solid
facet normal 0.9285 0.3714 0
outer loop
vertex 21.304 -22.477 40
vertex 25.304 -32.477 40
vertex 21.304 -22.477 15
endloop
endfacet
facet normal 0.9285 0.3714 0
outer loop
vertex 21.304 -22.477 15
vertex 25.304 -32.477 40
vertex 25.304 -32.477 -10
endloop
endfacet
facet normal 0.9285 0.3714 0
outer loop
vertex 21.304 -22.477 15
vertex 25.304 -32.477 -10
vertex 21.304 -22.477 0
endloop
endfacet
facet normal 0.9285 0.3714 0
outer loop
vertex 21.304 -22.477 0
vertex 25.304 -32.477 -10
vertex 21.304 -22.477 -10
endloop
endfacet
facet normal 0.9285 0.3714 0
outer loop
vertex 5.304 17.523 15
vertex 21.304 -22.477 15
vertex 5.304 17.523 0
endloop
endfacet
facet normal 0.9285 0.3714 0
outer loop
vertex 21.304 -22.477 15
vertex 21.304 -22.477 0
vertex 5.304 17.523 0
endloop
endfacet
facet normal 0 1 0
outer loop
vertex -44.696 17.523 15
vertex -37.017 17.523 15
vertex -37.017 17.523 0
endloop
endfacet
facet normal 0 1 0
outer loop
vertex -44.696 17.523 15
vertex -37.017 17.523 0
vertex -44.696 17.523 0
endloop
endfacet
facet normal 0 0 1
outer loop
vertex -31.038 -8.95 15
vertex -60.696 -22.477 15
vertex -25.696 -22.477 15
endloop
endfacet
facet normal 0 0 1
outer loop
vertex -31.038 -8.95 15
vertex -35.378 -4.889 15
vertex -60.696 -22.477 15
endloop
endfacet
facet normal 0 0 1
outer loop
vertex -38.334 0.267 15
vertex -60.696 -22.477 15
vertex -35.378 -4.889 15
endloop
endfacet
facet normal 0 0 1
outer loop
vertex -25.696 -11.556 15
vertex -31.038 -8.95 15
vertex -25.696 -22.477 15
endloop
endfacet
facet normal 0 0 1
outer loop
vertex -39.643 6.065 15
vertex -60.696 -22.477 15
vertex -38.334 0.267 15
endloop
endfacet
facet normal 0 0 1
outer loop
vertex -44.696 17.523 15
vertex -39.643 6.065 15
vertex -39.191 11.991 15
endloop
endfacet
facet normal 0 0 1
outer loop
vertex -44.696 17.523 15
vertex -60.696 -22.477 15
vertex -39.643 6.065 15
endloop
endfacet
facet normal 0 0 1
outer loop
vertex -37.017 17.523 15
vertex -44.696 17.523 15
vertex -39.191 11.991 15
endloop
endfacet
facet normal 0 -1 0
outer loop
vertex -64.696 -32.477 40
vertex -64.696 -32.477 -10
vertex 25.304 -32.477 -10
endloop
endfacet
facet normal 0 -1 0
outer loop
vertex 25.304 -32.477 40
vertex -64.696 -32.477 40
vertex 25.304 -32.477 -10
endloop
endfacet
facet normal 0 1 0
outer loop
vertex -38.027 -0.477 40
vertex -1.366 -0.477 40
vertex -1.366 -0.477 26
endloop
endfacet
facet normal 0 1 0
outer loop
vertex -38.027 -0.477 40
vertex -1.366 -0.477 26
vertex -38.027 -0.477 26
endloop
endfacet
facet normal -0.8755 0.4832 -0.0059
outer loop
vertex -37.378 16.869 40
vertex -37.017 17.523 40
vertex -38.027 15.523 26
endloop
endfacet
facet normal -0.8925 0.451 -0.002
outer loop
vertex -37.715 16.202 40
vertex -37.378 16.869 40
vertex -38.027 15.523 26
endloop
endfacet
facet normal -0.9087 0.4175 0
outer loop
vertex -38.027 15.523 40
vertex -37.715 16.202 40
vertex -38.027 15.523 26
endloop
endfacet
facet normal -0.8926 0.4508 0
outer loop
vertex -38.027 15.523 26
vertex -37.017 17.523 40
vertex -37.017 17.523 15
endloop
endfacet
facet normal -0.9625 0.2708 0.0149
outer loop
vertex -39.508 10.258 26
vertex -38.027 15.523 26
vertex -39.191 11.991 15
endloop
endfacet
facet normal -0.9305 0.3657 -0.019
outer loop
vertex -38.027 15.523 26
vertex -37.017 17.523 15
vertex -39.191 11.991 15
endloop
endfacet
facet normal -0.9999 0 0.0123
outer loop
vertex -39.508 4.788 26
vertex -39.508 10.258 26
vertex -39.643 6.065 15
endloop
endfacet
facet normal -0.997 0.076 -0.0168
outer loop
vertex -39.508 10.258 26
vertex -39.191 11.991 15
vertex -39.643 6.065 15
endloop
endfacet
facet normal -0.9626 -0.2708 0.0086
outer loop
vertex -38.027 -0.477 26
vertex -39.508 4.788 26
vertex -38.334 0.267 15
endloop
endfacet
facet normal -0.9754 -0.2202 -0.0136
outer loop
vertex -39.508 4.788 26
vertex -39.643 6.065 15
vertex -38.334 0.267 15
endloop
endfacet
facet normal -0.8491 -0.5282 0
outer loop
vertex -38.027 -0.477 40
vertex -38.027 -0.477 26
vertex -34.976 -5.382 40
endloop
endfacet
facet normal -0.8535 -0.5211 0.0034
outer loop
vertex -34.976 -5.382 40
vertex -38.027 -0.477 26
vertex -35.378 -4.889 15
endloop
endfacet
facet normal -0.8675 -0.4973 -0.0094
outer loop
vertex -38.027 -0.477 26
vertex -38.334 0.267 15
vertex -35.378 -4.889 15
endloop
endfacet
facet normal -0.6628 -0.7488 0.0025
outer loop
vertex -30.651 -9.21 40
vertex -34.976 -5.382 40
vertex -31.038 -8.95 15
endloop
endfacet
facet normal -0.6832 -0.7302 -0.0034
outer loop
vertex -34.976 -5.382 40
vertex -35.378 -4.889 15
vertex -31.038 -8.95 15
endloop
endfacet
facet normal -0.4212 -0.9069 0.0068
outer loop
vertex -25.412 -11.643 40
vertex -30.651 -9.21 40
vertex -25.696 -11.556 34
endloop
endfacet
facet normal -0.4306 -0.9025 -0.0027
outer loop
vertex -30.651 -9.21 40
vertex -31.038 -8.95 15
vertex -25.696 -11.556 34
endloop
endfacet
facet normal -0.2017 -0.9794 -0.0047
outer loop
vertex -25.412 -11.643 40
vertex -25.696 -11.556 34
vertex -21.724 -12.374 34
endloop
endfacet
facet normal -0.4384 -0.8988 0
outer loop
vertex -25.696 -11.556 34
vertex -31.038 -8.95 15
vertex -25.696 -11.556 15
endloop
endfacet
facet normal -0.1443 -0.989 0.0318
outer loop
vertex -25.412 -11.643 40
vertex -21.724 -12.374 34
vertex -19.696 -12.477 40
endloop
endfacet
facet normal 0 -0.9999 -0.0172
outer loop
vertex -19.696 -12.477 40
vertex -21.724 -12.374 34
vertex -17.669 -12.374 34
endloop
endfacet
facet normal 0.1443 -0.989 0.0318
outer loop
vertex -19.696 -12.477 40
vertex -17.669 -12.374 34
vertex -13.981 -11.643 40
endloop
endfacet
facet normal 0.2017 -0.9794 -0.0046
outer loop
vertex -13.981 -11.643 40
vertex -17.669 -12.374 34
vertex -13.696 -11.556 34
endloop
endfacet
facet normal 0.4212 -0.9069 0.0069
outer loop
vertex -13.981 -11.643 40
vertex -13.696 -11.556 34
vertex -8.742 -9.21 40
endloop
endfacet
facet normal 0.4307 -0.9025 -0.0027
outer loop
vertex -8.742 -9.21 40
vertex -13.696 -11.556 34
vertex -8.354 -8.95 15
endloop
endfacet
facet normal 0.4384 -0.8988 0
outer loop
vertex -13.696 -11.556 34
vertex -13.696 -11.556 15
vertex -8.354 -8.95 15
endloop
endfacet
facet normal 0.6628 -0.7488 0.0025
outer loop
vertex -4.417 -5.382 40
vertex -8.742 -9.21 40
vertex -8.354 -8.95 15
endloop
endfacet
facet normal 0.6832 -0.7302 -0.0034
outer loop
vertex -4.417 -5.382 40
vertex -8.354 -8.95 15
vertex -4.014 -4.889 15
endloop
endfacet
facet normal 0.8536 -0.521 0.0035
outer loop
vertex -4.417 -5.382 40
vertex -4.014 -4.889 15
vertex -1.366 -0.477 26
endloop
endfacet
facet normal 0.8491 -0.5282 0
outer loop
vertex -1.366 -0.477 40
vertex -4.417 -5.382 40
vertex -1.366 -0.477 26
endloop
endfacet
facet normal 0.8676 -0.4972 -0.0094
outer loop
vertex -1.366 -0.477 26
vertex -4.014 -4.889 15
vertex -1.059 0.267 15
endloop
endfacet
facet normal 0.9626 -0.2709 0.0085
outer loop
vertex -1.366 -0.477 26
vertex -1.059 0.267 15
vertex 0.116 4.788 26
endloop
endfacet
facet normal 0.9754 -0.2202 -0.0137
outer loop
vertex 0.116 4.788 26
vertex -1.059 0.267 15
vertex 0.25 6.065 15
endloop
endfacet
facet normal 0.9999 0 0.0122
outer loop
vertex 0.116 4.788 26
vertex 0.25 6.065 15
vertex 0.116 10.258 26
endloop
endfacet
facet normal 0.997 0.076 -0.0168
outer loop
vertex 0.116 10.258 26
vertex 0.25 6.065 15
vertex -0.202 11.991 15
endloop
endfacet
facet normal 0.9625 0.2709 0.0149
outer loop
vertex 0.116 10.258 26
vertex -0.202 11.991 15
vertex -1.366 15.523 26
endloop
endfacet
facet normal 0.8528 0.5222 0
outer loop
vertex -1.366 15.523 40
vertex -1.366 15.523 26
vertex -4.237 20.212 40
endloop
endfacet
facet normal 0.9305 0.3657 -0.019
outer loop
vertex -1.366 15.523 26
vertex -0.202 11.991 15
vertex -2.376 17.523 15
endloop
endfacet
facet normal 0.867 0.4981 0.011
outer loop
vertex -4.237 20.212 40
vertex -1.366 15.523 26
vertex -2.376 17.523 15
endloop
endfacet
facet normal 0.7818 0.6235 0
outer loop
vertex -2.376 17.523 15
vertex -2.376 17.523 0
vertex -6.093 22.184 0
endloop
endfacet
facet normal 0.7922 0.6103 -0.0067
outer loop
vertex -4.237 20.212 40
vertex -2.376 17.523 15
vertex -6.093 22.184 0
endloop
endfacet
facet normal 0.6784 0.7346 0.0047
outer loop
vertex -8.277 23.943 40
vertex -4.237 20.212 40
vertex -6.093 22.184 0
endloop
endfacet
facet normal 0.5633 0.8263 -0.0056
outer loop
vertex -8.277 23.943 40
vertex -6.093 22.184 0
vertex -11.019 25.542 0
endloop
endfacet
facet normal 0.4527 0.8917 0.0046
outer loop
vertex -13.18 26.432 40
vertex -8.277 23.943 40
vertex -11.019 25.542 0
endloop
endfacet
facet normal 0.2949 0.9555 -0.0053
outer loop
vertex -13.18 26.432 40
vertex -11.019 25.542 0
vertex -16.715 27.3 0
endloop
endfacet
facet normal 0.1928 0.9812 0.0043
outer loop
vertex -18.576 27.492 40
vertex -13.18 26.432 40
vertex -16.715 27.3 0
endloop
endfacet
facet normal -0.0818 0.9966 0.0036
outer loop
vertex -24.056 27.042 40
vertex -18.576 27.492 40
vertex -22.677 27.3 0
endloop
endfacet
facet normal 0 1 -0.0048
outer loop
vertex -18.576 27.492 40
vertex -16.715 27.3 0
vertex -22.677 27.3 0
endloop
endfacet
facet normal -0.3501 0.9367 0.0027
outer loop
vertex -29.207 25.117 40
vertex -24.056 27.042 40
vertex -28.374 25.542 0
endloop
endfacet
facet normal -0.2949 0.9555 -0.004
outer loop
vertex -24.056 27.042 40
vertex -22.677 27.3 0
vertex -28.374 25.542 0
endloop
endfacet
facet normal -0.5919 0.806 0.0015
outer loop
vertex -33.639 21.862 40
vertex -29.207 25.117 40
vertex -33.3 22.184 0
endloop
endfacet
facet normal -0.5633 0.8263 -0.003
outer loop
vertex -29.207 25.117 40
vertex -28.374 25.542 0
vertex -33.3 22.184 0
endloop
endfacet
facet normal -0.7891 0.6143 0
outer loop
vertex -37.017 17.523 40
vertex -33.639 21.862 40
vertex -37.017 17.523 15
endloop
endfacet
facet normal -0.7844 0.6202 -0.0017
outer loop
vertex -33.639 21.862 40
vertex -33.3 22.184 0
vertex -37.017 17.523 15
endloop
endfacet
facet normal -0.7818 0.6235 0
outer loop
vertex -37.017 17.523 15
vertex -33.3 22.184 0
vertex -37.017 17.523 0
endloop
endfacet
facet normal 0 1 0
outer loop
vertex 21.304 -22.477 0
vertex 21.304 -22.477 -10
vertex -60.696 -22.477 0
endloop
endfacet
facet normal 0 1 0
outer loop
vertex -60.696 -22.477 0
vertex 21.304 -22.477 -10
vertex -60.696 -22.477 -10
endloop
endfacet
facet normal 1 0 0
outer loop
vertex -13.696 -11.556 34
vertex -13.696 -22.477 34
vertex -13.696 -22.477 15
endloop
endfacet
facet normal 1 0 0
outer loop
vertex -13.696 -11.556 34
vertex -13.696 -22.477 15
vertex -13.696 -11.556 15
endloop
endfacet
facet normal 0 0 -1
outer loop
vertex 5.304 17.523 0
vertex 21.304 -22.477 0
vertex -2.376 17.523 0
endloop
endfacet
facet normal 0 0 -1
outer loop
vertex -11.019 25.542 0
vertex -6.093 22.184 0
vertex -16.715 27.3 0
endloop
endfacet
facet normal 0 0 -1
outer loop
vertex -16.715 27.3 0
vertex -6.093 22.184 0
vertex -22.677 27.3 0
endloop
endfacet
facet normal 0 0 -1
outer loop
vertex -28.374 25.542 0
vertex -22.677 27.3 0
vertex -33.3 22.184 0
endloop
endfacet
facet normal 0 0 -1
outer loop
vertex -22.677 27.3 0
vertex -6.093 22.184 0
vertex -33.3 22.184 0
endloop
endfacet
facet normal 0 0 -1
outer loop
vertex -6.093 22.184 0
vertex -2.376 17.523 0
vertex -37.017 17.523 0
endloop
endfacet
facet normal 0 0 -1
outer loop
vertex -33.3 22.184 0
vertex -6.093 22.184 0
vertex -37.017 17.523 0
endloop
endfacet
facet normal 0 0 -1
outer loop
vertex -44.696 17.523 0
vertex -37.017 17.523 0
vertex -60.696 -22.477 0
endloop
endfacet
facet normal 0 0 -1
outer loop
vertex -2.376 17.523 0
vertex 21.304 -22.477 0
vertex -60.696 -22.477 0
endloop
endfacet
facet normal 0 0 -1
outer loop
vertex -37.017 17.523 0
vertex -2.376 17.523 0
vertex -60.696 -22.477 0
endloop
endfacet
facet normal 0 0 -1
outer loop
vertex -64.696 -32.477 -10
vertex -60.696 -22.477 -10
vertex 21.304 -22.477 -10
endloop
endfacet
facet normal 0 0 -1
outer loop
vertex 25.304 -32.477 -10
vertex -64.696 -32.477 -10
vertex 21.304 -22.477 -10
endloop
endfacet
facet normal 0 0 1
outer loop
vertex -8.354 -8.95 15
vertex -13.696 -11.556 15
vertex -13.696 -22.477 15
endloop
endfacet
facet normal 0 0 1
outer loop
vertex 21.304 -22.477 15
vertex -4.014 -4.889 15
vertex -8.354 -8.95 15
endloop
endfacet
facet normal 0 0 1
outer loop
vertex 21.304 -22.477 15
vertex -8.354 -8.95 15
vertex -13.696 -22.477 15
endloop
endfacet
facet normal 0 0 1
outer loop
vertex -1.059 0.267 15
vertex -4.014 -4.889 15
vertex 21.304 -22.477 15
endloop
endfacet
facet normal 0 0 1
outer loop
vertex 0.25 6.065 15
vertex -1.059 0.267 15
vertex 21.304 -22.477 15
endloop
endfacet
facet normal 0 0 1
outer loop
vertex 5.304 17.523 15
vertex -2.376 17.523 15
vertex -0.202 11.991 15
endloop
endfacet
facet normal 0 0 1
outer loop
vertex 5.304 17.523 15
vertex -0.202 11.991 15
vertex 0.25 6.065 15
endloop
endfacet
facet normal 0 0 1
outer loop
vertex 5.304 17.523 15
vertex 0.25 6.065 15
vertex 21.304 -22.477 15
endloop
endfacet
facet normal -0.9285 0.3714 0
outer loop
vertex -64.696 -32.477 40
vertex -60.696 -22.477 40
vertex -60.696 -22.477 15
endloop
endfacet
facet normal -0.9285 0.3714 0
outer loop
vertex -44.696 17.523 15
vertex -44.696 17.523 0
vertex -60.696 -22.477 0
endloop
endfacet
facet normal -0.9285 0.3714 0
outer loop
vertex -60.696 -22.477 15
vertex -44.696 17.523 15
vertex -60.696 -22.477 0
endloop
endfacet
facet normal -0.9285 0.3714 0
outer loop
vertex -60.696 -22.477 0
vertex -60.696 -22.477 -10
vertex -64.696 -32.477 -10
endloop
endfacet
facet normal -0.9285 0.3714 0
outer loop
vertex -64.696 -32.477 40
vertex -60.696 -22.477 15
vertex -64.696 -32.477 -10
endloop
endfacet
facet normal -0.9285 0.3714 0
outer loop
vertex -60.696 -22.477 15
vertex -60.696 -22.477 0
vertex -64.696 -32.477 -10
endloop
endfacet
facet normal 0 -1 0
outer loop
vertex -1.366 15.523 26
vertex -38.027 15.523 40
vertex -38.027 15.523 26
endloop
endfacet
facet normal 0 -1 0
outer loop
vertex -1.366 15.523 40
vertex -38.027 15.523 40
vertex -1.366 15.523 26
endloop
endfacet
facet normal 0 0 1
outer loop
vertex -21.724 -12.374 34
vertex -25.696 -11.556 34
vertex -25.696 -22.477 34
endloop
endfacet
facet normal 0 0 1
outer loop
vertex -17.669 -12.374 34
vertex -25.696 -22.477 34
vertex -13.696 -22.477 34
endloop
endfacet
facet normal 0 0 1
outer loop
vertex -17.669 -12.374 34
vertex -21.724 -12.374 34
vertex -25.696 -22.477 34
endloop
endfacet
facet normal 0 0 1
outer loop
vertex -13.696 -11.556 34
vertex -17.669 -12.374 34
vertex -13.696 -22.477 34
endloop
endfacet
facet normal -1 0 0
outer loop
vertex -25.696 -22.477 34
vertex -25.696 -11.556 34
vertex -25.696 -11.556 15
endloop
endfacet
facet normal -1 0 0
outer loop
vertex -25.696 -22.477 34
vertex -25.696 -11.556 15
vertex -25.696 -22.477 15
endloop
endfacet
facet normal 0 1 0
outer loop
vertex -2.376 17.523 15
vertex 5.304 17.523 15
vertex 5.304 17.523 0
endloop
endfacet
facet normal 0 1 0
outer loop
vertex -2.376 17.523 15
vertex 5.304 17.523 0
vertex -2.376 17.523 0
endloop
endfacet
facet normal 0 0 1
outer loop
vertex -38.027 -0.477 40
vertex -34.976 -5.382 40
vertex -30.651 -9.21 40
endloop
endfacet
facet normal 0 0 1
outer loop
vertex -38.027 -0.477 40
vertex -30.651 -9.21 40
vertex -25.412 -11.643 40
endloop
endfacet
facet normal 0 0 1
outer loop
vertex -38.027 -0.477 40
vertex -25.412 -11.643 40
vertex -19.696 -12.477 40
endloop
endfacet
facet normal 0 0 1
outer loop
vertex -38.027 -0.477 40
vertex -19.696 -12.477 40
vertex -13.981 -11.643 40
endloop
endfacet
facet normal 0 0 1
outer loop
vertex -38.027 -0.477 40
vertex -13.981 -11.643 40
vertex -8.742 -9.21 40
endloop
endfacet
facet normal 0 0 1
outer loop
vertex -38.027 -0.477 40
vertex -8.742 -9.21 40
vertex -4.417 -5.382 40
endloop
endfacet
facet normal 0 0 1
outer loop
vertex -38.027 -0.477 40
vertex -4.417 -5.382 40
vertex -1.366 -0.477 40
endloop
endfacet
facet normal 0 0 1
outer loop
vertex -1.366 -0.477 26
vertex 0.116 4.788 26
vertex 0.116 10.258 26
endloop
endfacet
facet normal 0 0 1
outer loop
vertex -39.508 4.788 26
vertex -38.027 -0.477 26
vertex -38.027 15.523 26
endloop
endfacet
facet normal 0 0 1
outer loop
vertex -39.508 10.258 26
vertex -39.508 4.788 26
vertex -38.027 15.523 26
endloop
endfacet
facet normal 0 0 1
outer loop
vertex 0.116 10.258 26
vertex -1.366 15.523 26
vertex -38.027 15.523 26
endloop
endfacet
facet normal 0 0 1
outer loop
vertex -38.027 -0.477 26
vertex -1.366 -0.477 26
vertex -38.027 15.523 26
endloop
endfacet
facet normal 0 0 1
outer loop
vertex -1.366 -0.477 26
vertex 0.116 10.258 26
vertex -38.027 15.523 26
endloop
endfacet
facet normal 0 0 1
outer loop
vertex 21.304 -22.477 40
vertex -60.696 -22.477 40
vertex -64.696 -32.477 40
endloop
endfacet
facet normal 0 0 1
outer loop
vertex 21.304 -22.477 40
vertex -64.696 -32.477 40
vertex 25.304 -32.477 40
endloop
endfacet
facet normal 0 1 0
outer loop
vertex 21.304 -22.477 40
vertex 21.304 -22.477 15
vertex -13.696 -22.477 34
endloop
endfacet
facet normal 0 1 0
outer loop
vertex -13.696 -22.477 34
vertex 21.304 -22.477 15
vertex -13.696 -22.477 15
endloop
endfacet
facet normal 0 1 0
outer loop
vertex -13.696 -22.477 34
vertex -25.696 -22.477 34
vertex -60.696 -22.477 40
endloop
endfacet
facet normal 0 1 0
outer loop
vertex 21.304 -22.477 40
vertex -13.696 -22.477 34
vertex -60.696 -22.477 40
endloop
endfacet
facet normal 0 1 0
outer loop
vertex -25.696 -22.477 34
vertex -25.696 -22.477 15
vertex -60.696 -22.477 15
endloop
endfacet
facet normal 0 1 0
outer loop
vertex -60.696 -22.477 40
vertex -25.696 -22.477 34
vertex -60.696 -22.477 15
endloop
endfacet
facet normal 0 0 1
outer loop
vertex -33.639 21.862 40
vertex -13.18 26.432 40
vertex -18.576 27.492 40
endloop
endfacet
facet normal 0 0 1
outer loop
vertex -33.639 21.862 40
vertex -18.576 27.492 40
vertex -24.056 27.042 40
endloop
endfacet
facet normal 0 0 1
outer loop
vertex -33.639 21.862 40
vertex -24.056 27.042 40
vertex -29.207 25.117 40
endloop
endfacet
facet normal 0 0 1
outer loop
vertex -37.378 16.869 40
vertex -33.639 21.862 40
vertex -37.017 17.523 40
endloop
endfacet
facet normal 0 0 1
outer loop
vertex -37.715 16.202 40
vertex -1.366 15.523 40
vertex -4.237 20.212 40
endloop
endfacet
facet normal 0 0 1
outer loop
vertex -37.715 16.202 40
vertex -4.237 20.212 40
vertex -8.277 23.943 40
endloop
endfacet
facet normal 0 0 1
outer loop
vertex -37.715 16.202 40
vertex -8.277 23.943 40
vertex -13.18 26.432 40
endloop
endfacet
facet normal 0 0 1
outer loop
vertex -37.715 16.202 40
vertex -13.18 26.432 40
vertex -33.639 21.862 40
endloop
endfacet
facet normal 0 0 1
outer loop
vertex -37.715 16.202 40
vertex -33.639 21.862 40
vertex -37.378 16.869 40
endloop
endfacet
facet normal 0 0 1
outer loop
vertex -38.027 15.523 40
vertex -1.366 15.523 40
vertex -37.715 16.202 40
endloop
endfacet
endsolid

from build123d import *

# Parameters (mm, degrees)
BOSS_EXTRUDE1_DEPTH      = 40
BOSS_EXTRUDE1_DEPTH_BACK = 10
BOSS_EXTRUDE2_DEPTH      = 15
BOSS_EXTRUDE3_DEPTH      = 34
BOSS_EXTRUDE4_DEPTH      = 40
CUT_EXTRUDE1_DEPTH       = 14


with BuildPart() as part:
    # Sketch1 → Boss-Extrude1 (new, two sides: drawn at the far end of the back side and taken through both)
    with BuildSketch(Plane.XY.offset(-BOSS_EXTRUDE1_DEPTH_BACK)):
        Polygon((-60.696298415, -22.477026296), (-64.696298415, -32.477026296), (-44.696298415, -32.477026296), (-25.696298415, -32.477026296), (-13.696298415, -32.477026296), (25.303701585, -32.477026296), (21.303701585, -22.477026296), (-13.696298415, -22.477026296), (-25.696298415, -22.477026296), align=None)
    extrude(amount=BOSS_EXTRUDE1_DEPTH + BOSS_EXTRUDE1_DEPTH_BACK)

    # Sketch1<3> → Boss-Extrude2 (add)
    with BuildSketch(Plane.XY):
        with BuildLine():
            Line((-44.696298415, 17.522973704), (-60.696298415, -22.477026296))
            Line((-60.696298415, -22.477026296), (-25.696298415, -22.477026296))
            Line((-25.696298415, -22.477026296), (-25.696298415, -11.555810324))
            ThreePointArc((-25.696298415, -11.555810324), (-38.33377261, 0.267316902), (-37.016806491, 17.522973704))
            Line((-37.016806491, 17.522973704), (-44.696298415, 17.522973704))
        make_face()
        with BuildLine():
            Line((-13.696298415, -11.555810324), (-13.696298415, -22.477026296))
            Line((-13.696298415, -22.477026296), (21.303701585, -22.477026296))
            Line((21.303701585, -22.477026296), (5.303701585, 17.522973704))
            Line((5.303701585, 17.522973704), (-2.375790339, 17.522973704))
            ThreePointArc((-2.375790339, 17.522973704), (-1.05882422, 0.267316902), (-13.696298415, -11.555810324))
        make_face()
    extrude(amount=BOSS_EXTRUDE2_DEPTH)

    # Sketch1<4> → Boss-Extrude3 (add)
    with BuildSketch(Plane.XY):
        with BuildLine():
            Line((-25.696298415, -11.555810324), (-25.696298415, -22.477026296))
            Line((-25.696298415, -22.477026296), (-13.696298415, -22.477026296))
            Line((-13.696298415, -22.477026296), (-13.696298415, -11.555810324))
            ThreePointArc((-13.696298415, -11.555810324), (-19.696298415, -12.477026296), (-25.696298415, -11.555810324))
        make_face()
    extrude(amount=BOSS_EXTRUDE3_DEPTH)

    # Sketch1<6> → Boss-Extrude4 (add)
    with BuildSketch(Plane.XY):
        with BuildLine():
            ThreePointArc((-2.375790339, 17.522973704), (-19.696298415, 27.522973704), (-37.016806491, 17.522973704))
            ThreePointArc((-37.016806491, 17.522973704), (-38.33377261, 0.267316902), (-25.696298415, -11.555810324))
            ThreePointArc((-25.696298415, -11.555810324), (-19.696298415, -12.477026296), (-13.696298415, -11.555810324))
            ThreePointArc((-13.696298415, -11.555810324), (-3.571782918, -4.309185862), (0.303701585, 7.522973704))
            ThreePointArc((0.303701585, 7.522973704), (-0.377781889, 12.699354606), (-2.375790339, 17.522973704))
        make_face()
    extrude(amount=BOSS_EXTRUDE4_DEPTH)

    # Sketch2 → Cut-Extrude1 (cut)
    with BuildSketch(Plane.XY.offset(40)):
        with BuildLine():
            Line((-39.696298415, 15.522973704), (0.303701585, 15.522973704))
            ThreePointArc((0.303701585, 15.522973704), (8.303701585, 7.522973704), (0.303701585, -0.477026296))
            Line((0.303701585, -0.477026296), (-39.696298415, -0.477026296))
            ThreePointArc((-39.696298415, -0.477026296), (-47.696298415, 7.522973704), (-39.696298415, 15.522973704))
        make_face()
    extrude(amount=-CUT_EXTRUDE1_DEPTH, mode=Mode.SUBTRACT)


solid = part.part
